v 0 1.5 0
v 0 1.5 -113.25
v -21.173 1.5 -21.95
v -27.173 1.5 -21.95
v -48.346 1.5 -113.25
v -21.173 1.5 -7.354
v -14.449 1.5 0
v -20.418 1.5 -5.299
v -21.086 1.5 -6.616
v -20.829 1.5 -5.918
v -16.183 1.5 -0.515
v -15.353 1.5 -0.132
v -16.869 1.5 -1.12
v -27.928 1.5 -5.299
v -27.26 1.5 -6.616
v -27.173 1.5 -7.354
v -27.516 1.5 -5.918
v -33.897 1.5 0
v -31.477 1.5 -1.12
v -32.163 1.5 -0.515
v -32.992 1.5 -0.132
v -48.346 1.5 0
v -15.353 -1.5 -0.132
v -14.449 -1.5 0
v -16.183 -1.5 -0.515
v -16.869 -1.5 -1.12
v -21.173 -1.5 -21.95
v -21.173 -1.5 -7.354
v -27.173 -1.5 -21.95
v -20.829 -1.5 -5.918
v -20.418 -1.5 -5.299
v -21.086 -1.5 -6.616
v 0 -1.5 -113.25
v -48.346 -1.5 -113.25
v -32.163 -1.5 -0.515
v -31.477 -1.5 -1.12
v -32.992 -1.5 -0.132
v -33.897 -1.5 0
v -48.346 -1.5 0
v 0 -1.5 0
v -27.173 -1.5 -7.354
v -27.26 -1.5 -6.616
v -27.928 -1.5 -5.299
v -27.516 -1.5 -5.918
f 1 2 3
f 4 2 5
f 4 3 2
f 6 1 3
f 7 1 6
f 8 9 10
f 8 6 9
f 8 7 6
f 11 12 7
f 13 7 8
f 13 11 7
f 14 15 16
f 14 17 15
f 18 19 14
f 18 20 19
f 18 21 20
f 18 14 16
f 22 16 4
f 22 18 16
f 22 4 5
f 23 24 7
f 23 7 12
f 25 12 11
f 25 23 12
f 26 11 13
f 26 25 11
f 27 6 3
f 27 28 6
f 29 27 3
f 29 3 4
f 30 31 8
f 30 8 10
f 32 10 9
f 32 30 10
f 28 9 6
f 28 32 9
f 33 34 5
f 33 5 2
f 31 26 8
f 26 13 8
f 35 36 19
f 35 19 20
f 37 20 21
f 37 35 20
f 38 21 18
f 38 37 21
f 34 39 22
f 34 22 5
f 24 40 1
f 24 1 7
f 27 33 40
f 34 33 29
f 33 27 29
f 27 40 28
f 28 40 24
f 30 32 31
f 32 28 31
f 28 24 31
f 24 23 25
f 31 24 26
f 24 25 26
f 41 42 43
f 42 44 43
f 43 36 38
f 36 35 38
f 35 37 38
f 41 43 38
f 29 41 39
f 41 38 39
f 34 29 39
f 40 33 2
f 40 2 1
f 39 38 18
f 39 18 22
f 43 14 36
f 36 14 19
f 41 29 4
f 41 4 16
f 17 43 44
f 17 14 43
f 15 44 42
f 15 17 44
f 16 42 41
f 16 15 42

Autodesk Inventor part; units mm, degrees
ref_plane "YZ Plane" through (0, 0, 0) normal (1, 0, 0) x (0, 1, 0)
ref_plane "XZ Plane" through (0, 0, 0) normal (0, 1, 0) x (-1, 0, 0)
ref_plane "XY Plane" through (0, 0, 0) normal (0, 0, 1) x (1, 0, 0)
sketch "Sketch1" plane through (0, 0, 0) normal (0, 1, 0) x (-1, 0, 0)
  line L0 (0, 0) -> (48.3455, 0)
  line L1 (48.3455, 0) -> (48.3455, -113.25)
  line L2 (48.3455, -113.25) -> (0, -113.25)
  line L3 (0, -113.25) -> (0, 0)
  line L4 (27.1728, 0) -> (21.1727, 0)
  line L5 (21.1727, 0) -> (21.1727, -21.95)
  line L6 (21.1727, -21.95) -> (27.1728, -21.95)
  line L7 (27.1728, -21.95) -> (27.1728, 0)
  line L8 (29.1728, 0) -> (19.1728, 0)
  line L9 (19.1728, 0) -> (19.1728, -3.302)
  line L10 (19.1728, -3.302) -> (29.1728, -3.302)
  line L11 (29.1728, -3.302) -> (29.1728, 0)
  point P0 (27.1728, -3.302)
  point P1 (21.1727, -3.302)
  dimension "d0" = 113.25
  dimension "d1" = 48.3455
  dimension "d2" = 91.3
  dimension "d3" = 6
  dimension "d4" = 21.1728
  dimension "d5" = 21.1728
  dimension "d6" = 10
  dimension "d7" = 3.302
  dimension "d8" = 2
  dimension "d9" = 2
extrude "Extrusion1" add sketch "Sketch1" along normal mid plane 3 contours L0 L9 L10 L5 L6 L7 L11 L1 L2 L3
sketch "Sketch2" plane through (0, 1.5, 0) normal (0, 1, 0) x (1, 0, 0)
  line L0 (-48.3455, 0) -> (-29.1728, 0) projected
  line L1 (-32.4278, 0) -> (-15.9178, 0)
  line L2 (-15.9178, 0) -> (-24.1728, 9.721)
  line L3 (-24.1728, 9.721) -> (-32.4278, 0)
  line L4 (-29.1728, 0) -> (-29.1728, 3.302) projected
  line L5 (-19.1728, 3.302) -> (-19.1728, 0) projected
  point P0 (0, 0)
  dimension "d12" = 8.255
  dimension "d13" = 16.51
  dimension "d14" = 8.255
  dimension "d15" = 3.255
  dimension "d16" = 3.255
extrude "Extrusion2" cut sketch "Sketch2" against normal up to surface (3 mm away)
fillet "Fillet1" radius 3.175 4 edges at (-27.1728, 0, -6.1882) (-21.1728, 0, -6.1882) (-32.4278, 0, 0) (-15.9178, 0, 0)
equation "\"d4\" = d5"
equation "\"d8\" = d9"
equation "\"d12\" = d14"
equation "\"d15\" = d16"
properties part number "avbay sled"
